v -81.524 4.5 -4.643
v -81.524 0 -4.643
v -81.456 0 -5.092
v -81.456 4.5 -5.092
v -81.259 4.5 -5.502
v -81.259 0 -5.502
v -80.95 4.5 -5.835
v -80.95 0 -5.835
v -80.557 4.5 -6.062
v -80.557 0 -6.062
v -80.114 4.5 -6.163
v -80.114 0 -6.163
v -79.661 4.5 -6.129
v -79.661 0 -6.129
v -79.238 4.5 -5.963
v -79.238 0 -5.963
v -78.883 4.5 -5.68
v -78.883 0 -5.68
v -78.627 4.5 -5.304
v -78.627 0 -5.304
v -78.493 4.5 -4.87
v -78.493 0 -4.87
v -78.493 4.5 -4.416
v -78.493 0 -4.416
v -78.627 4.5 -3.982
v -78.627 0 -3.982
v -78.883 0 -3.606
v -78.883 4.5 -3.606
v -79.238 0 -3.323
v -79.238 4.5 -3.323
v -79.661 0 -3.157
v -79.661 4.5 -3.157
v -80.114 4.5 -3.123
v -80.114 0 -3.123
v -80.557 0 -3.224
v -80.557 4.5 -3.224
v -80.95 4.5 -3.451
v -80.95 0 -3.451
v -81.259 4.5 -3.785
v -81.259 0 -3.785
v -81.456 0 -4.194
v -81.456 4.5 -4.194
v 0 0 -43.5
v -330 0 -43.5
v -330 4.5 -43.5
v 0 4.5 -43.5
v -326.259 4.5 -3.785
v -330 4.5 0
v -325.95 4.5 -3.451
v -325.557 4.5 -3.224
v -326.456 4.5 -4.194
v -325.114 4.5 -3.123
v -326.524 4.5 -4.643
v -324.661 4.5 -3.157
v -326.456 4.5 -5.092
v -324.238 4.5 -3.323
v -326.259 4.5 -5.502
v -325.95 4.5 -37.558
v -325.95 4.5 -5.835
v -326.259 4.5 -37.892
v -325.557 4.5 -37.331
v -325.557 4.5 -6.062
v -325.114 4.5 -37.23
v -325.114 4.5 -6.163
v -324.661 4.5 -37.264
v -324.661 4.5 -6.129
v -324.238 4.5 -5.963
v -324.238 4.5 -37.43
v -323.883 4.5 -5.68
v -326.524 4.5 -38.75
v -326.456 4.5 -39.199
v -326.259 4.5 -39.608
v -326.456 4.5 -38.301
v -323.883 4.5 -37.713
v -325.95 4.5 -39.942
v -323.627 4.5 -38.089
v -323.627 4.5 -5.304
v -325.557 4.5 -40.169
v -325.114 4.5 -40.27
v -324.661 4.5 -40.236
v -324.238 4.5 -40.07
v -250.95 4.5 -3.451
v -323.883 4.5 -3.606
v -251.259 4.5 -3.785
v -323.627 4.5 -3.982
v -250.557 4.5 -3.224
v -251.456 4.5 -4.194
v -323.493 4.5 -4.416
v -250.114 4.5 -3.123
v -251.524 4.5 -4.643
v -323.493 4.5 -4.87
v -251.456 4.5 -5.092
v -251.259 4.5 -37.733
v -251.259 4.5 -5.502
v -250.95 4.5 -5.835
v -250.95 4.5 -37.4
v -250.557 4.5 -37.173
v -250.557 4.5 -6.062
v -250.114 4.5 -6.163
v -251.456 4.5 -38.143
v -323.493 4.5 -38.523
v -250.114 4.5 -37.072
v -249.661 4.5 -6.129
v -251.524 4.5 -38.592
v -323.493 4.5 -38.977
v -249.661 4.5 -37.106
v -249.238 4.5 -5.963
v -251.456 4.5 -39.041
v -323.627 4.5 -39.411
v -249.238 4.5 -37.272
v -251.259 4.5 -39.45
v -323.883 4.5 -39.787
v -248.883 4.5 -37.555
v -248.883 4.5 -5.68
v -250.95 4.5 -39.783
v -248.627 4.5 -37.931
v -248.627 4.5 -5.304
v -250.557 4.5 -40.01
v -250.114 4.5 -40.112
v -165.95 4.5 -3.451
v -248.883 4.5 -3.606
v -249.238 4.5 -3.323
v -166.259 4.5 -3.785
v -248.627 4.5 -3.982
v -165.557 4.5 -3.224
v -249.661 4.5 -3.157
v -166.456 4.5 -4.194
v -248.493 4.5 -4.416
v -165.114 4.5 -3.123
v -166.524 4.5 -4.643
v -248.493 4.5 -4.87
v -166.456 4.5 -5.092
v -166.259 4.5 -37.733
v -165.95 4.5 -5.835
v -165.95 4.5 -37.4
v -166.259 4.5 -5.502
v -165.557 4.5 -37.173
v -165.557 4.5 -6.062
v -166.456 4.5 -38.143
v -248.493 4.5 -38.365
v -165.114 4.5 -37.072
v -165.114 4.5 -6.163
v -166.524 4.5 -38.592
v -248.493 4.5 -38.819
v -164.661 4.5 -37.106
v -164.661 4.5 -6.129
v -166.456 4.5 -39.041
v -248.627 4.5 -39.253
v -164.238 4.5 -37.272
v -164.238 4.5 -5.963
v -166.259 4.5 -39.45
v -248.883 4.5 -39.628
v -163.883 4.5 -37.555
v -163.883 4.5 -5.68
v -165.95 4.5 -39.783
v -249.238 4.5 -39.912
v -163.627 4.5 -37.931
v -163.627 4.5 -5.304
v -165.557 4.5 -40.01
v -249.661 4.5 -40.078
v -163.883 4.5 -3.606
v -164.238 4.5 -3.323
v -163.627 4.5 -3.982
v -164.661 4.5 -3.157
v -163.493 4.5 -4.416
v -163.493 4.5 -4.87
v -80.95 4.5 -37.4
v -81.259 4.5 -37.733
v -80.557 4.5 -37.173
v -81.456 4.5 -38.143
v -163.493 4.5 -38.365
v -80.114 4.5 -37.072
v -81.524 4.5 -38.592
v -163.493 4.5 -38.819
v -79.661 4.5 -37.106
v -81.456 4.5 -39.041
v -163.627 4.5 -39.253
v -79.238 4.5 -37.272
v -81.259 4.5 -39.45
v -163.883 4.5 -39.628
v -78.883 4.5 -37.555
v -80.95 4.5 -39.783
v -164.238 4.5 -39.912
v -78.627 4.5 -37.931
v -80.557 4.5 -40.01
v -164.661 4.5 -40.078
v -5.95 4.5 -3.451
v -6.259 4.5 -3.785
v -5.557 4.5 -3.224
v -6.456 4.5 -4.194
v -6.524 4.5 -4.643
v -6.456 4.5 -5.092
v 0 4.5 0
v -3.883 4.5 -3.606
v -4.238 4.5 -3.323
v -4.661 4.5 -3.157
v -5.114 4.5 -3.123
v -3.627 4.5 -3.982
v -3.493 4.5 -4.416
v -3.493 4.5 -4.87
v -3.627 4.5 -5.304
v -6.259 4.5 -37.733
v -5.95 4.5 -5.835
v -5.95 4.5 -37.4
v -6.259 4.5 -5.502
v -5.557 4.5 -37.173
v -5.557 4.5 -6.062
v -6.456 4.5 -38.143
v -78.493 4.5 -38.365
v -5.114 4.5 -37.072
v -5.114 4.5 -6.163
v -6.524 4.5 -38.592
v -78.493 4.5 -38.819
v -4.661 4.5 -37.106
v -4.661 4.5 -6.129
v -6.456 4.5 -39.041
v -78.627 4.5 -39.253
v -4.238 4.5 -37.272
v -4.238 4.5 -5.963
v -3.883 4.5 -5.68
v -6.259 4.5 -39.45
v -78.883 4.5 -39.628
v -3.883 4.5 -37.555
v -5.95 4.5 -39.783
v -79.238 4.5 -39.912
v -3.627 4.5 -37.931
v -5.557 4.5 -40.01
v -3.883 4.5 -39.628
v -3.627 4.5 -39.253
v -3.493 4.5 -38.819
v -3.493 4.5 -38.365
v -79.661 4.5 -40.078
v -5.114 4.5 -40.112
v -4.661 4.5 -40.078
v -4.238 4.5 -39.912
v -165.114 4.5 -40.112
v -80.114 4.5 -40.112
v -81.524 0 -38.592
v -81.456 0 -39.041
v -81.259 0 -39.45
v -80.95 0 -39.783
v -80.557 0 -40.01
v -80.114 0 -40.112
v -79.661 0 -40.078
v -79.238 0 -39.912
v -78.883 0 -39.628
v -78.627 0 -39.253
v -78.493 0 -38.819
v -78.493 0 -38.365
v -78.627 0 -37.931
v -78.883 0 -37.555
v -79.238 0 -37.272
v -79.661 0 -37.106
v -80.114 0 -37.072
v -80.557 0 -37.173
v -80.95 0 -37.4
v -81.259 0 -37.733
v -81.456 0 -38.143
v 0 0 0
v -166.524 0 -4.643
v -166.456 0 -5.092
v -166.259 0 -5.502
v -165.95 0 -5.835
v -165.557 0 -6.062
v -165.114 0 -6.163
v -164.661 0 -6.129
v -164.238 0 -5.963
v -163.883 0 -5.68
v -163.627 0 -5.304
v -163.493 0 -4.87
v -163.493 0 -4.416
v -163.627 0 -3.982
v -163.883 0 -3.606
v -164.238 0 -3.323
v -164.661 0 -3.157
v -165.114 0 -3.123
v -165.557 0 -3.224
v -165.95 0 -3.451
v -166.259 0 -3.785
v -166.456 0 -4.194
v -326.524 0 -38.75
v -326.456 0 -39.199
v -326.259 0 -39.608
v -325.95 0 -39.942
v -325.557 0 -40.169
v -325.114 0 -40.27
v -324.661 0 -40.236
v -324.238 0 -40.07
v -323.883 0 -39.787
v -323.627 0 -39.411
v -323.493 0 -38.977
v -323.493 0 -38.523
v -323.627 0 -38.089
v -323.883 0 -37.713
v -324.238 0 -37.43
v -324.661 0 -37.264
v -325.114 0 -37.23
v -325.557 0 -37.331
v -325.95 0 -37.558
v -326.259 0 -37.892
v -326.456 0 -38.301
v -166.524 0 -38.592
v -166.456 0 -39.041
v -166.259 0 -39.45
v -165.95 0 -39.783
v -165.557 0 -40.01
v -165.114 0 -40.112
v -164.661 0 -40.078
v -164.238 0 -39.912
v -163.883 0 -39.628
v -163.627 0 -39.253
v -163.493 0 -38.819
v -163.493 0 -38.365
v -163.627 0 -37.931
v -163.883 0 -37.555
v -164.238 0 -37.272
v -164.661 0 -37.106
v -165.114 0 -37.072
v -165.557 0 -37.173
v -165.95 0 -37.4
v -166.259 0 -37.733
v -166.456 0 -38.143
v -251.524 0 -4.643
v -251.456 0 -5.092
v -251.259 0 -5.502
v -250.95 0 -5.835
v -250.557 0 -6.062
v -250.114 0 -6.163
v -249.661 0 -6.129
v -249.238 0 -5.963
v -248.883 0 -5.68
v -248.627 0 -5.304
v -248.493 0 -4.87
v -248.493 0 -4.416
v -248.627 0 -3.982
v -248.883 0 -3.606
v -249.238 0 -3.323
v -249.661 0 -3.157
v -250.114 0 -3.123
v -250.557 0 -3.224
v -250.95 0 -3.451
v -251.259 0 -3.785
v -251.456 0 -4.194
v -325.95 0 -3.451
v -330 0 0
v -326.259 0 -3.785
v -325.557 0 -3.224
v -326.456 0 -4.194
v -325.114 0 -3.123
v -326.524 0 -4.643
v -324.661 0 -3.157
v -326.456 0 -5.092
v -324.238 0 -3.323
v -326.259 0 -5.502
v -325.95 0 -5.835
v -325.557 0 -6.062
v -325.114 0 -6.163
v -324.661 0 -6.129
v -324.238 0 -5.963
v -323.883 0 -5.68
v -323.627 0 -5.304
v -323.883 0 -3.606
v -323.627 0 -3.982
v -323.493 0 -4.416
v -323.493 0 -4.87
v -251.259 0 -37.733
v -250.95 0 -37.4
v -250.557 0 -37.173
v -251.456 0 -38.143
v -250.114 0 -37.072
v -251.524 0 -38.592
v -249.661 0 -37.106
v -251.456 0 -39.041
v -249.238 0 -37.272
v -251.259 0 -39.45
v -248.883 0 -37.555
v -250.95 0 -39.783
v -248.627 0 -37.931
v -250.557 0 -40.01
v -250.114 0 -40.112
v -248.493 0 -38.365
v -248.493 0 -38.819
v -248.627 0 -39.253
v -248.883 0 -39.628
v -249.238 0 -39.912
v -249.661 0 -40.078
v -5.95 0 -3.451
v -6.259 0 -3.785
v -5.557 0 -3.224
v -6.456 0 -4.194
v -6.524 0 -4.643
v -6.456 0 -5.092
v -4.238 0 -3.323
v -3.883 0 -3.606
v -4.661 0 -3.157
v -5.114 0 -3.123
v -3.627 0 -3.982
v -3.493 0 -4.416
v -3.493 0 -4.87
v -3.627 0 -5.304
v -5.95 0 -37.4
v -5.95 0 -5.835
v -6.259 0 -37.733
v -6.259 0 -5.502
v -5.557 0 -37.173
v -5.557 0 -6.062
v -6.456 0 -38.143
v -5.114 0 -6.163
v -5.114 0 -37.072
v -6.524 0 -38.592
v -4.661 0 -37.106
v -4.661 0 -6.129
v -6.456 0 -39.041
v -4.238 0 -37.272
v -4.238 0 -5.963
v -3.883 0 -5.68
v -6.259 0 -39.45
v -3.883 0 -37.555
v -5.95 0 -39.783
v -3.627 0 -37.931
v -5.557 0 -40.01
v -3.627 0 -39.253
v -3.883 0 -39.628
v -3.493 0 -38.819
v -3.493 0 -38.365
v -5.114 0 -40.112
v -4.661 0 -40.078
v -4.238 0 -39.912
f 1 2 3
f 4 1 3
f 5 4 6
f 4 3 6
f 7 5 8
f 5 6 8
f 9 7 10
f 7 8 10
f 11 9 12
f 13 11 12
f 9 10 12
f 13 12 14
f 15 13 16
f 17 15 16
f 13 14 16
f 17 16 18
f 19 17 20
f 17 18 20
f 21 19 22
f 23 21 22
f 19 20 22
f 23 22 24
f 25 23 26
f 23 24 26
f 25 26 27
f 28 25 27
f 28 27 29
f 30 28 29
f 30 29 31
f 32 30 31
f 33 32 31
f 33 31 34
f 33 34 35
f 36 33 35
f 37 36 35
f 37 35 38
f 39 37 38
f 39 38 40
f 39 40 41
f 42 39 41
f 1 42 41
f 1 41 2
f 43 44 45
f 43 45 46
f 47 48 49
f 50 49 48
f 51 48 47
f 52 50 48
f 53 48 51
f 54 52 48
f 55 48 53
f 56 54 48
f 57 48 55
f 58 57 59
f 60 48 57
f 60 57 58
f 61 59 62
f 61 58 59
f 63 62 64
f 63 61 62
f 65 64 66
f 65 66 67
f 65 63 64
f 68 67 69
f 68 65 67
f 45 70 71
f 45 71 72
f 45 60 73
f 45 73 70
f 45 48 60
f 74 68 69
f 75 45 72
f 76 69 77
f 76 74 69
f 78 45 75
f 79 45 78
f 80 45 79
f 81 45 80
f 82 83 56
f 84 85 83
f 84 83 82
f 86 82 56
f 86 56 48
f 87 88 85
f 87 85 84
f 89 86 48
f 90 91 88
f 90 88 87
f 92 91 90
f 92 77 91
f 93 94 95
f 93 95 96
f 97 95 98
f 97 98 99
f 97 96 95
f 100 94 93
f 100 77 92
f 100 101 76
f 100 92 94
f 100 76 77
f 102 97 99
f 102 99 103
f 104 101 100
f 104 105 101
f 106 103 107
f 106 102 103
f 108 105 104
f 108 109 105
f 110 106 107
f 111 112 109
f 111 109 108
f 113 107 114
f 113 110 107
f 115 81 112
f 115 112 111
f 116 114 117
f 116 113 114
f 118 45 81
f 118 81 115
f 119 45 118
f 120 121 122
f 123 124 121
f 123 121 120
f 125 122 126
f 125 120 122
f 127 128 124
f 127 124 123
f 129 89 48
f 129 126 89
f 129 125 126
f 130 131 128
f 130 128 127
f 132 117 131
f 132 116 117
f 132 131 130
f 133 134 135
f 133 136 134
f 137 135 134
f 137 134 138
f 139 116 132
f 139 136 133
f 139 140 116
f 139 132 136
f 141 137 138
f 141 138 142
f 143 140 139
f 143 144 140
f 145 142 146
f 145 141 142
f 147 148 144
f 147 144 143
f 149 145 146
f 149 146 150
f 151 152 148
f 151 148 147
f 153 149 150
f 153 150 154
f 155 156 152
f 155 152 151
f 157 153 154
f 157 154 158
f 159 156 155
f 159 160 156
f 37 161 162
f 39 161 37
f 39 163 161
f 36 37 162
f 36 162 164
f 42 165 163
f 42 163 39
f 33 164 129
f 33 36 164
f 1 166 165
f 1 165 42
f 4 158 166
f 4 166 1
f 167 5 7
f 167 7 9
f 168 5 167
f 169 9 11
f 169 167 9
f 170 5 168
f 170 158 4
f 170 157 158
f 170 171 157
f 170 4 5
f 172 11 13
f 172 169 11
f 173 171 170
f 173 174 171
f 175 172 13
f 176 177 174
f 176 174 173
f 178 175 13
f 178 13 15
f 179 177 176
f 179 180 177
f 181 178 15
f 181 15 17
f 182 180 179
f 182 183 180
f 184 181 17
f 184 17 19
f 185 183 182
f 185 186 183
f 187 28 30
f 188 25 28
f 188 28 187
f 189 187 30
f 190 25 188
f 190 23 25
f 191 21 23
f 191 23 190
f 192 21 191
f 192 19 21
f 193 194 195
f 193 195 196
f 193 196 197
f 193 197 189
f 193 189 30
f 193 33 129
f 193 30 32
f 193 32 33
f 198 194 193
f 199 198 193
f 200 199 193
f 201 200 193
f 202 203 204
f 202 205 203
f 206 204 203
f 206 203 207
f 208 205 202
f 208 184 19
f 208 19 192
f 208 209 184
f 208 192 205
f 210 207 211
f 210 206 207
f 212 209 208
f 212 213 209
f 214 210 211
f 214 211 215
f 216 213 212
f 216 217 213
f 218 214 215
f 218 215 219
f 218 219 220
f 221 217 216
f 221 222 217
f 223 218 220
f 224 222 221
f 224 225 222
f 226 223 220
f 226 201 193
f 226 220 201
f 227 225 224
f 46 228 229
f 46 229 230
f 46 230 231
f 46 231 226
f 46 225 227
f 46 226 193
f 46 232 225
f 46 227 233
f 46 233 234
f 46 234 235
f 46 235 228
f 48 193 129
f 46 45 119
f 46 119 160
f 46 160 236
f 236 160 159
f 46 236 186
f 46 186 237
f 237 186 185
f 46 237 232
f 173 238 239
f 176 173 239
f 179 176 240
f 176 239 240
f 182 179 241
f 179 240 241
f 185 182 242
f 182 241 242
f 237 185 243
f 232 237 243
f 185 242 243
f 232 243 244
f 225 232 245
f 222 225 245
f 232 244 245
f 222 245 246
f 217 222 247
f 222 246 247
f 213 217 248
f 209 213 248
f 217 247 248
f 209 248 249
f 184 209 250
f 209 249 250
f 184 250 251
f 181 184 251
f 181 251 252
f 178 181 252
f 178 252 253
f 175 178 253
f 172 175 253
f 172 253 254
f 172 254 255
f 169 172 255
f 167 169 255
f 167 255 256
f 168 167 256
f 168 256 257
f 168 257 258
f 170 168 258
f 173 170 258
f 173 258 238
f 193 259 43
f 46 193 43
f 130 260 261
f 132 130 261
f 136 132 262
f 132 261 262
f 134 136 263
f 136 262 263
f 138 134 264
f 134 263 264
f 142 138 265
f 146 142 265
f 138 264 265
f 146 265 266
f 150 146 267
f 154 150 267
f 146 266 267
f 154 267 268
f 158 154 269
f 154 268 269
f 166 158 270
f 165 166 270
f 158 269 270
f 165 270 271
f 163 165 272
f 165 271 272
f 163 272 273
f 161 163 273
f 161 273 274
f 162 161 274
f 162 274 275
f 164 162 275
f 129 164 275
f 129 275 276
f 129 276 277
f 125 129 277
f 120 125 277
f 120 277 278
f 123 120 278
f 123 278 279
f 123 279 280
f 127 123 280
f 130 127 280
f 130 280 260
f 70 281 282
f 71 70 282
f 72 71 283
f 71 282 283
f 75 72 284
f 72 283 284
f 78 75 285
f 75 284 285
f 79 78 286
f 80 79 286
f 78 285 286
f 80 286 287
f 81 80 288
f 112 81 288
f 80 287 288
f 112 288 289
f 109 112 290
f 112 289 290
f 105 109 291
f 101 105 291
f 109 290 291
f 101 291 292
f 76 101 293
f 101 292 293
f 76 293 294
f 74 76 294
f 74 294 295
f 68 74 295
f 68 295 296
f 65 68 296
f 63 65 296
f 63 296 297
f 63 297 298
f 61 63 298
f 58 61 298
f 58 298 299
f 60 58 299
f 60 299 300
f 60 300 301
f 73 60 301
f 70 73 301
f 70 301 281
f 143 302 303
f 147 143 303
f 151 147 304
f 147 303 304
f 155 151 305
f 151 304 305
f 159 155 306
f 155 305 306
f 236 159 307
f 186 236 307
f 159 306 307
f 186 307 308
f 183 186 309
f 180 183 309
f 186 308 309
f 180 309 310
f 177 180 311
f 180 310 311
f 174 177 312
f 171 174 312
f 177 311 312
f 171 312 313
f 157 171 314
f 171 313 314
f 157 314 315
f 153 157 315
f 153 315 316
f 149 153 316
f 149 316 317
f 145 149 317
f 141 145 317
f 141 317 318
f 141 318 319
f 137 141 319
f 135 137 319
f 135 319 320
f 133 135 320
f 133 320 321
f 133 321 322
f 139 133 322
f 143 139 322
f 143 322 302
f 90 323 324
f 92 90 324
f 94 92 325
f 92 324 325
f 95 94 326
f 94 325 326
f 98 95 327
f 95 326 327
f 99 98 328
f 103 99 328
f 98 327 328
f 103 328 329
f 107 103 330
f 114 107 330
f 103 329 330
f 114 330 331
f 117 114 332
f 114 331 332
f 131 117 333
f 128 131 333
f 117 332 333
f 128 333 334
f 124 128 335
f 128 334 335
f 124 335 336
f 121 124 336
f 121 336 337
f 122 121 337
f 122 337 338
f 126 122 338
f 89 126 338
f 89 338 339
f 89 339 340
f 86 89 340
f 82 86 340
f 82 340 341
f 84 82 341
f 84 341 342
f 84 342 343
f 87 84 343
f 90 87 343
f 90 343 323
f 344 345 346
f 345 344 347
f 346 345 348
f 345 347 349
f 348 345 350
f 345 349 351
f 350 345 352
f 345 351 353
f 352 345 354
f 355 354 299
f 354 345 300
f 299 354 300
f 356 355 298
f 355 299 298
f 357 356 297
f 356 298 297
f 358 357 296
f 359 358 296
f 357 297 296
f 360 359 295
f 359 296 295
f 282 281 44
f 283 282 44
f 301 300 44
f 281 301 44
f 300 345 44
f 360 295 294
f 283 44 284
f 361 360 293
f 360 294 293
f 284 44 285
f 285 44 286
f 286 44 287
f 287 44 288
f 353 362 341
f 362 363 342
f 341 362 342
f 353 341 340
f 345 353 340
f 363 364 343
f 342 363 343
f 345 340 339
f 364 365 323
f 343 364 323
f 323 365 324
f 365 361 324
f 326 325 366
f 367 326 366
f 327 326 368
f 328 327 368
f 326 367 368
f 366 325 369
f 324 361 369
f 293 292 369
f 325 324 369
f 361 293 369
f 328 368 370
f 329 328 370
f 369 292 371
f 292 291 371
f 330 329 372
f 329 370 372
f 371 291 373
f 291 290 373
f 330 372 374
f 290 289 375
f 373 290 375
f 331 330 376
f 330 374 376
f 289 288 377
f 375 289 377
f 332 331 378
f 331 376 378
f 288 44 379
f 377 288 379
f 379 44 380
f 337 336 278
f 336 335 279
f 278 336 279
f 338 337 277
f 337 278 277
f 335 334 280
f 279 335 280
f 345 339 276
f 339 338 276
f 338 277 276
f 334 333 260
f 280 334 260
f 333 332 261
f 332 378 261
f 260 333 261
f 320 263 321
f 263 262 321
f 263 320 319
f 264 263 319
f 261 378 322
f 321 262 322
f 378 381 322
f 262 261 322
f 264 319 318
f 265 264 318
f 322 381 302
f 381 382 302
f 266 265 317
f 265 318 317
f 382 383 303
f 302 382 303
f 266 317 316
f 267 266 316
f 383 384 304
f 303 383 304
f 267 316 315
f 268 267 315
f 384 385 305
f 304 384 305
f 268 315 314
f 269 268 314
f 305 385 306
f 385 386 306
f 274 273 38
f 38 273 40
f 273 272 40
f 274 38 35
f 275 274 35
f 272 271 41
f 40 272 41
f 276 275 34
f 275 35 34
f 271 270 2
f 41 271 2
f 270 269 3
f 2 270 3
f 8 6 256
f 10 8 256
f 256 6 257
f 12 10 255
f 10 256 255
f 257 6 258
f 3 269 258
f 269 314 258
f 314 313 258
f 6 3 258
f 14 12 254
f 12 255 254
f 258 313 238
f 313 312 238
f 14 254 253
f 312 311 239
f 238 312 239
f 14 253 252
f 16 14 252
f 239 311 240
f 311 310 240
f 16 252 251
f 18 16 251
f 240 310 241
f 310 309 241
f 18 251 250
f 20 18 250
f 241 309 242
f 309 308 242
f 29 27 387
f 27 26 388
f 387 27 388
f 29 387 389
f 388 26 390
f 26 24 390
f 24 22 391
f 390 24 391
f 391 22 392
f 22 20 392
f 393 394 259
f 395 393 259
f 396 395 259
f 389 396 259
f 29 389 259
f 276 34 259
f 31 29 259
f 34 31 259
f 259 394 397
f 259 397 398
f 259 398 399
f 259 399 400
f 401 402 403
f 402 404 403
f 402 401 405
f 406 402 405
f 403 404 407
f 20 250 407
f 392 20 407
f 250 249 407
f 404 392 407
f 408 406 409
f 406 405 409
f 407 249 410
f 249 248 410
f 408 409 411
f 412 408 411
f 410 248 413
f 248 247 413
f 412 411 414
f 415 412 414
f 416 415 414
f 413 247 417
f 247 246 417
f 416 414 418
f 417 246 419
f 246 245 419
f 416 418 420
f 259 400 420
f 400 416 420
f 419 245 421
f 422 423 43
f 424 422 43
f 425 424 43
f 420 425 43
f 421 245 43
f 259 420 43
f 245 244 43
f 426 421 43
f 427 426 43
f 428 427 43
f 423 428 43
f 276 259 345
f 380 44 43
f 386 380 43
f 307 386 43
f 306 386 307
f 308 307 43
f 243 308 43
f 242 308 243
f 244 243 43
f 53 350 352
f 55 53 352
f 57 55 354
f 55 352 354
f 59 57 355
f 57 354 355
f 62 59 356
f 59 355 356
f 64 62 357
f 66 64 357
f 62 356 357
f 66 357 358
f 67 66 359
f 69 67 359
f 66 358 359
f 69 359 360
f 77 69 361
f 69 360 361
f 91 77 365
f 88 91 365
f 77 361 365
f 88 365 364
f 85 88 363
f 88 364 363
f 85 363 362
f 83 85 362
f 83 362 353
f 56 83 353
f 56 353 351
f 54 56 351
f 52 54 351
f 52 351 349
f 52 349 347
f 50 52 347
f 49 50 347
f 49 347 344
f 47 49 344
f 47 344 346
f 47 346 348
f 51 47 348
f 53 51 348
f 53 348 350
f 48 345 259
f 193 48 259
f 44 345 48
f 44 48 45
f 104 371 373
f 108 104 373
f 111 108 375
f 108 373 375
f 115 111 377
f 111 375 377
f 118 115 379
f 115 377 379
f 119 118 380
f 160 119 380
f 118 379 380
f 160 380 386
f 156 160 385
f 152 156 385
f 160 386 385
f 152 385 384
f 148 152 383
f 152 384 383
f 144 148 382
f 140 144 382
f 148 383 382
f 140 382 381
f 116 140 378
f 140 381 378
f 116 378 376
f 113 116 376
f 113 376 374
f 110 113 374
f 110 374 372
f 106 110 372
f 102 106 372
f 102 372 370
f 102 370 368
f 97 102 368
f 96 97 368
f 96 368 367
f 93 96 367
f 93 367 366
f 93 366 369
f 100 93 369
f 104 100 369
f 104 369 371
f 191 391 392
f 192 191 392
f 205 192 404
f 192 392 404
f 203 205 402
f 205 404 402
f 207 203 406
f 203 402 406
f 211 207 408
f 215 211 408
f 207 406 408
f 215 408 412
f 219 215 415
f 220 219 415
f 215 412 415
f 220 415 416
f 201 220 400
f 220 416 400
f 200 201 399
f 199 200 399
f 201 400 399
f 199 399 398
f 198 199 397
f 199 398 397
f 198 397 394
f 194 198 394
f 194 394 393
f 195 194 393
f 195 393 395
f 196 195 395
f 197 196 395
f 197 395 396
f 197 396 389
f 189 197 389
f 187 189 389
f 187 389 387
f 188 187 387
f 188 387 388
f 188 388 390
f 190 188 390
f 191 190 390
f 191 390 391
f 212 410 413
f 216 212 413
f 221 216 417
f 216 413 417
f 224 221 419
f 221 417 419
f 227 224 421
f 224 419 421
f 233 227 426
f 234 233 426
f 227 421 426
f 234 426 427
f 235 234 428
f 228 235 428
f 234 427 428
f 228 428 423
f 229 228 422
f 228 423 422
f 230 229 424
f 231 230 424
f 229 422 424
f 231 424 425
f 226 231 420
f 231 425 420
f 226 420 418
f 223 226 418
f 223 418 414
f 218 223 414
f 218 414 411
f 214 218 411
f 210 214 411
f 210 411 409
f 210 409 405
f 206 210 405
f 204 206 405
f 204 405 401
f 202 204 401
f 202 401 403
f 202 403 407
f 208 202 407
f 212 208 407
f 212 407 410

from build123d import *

# Parameters (mm, degrees)
SKETCH1_W                  = 330
SKETCH1_H                  = 43.5
BOSS_EXTRUDE1_DEPTH        = 4.5
F_31_0_12_DIAMETER_HOLE3_D = 3.048


with BuildPart() as part:
    # Sketch1 → Boss-Extrude1 (new body)
    with BuildSketch(Plane(origin=(0, 0, 0), x_dir=(1, 0, 0), z_dir=(0, 1, 0))):
        with Locations((-165, 21.75)):
            Rectangle(SKETCH1_W, SKETCH1_H)
    extrude(amount=BOSS_EXTRUDE1_DEPTH)

    # #31 (0.12) Diameter Hole3 (through all)
    with Locations(Plane(origin=(0, 4.5, 0), x_dir=(1, 0, 0), z_dir=(0, 1, 0))):
        with Locations((-325, 38.75), (-325, 4.64300545), (-250, 4.64300545), (-250, 38.591771868), (-165, 38.591771868), (-165, 4.64300545), (-80, 4.64300545), (-80, 38.591771868), (-5, 38.591771868), (-5, 4.64300545)):
            Hole(F_31_0_12_DIAMETER_HOLE3_D / 2)


solid = part.part
